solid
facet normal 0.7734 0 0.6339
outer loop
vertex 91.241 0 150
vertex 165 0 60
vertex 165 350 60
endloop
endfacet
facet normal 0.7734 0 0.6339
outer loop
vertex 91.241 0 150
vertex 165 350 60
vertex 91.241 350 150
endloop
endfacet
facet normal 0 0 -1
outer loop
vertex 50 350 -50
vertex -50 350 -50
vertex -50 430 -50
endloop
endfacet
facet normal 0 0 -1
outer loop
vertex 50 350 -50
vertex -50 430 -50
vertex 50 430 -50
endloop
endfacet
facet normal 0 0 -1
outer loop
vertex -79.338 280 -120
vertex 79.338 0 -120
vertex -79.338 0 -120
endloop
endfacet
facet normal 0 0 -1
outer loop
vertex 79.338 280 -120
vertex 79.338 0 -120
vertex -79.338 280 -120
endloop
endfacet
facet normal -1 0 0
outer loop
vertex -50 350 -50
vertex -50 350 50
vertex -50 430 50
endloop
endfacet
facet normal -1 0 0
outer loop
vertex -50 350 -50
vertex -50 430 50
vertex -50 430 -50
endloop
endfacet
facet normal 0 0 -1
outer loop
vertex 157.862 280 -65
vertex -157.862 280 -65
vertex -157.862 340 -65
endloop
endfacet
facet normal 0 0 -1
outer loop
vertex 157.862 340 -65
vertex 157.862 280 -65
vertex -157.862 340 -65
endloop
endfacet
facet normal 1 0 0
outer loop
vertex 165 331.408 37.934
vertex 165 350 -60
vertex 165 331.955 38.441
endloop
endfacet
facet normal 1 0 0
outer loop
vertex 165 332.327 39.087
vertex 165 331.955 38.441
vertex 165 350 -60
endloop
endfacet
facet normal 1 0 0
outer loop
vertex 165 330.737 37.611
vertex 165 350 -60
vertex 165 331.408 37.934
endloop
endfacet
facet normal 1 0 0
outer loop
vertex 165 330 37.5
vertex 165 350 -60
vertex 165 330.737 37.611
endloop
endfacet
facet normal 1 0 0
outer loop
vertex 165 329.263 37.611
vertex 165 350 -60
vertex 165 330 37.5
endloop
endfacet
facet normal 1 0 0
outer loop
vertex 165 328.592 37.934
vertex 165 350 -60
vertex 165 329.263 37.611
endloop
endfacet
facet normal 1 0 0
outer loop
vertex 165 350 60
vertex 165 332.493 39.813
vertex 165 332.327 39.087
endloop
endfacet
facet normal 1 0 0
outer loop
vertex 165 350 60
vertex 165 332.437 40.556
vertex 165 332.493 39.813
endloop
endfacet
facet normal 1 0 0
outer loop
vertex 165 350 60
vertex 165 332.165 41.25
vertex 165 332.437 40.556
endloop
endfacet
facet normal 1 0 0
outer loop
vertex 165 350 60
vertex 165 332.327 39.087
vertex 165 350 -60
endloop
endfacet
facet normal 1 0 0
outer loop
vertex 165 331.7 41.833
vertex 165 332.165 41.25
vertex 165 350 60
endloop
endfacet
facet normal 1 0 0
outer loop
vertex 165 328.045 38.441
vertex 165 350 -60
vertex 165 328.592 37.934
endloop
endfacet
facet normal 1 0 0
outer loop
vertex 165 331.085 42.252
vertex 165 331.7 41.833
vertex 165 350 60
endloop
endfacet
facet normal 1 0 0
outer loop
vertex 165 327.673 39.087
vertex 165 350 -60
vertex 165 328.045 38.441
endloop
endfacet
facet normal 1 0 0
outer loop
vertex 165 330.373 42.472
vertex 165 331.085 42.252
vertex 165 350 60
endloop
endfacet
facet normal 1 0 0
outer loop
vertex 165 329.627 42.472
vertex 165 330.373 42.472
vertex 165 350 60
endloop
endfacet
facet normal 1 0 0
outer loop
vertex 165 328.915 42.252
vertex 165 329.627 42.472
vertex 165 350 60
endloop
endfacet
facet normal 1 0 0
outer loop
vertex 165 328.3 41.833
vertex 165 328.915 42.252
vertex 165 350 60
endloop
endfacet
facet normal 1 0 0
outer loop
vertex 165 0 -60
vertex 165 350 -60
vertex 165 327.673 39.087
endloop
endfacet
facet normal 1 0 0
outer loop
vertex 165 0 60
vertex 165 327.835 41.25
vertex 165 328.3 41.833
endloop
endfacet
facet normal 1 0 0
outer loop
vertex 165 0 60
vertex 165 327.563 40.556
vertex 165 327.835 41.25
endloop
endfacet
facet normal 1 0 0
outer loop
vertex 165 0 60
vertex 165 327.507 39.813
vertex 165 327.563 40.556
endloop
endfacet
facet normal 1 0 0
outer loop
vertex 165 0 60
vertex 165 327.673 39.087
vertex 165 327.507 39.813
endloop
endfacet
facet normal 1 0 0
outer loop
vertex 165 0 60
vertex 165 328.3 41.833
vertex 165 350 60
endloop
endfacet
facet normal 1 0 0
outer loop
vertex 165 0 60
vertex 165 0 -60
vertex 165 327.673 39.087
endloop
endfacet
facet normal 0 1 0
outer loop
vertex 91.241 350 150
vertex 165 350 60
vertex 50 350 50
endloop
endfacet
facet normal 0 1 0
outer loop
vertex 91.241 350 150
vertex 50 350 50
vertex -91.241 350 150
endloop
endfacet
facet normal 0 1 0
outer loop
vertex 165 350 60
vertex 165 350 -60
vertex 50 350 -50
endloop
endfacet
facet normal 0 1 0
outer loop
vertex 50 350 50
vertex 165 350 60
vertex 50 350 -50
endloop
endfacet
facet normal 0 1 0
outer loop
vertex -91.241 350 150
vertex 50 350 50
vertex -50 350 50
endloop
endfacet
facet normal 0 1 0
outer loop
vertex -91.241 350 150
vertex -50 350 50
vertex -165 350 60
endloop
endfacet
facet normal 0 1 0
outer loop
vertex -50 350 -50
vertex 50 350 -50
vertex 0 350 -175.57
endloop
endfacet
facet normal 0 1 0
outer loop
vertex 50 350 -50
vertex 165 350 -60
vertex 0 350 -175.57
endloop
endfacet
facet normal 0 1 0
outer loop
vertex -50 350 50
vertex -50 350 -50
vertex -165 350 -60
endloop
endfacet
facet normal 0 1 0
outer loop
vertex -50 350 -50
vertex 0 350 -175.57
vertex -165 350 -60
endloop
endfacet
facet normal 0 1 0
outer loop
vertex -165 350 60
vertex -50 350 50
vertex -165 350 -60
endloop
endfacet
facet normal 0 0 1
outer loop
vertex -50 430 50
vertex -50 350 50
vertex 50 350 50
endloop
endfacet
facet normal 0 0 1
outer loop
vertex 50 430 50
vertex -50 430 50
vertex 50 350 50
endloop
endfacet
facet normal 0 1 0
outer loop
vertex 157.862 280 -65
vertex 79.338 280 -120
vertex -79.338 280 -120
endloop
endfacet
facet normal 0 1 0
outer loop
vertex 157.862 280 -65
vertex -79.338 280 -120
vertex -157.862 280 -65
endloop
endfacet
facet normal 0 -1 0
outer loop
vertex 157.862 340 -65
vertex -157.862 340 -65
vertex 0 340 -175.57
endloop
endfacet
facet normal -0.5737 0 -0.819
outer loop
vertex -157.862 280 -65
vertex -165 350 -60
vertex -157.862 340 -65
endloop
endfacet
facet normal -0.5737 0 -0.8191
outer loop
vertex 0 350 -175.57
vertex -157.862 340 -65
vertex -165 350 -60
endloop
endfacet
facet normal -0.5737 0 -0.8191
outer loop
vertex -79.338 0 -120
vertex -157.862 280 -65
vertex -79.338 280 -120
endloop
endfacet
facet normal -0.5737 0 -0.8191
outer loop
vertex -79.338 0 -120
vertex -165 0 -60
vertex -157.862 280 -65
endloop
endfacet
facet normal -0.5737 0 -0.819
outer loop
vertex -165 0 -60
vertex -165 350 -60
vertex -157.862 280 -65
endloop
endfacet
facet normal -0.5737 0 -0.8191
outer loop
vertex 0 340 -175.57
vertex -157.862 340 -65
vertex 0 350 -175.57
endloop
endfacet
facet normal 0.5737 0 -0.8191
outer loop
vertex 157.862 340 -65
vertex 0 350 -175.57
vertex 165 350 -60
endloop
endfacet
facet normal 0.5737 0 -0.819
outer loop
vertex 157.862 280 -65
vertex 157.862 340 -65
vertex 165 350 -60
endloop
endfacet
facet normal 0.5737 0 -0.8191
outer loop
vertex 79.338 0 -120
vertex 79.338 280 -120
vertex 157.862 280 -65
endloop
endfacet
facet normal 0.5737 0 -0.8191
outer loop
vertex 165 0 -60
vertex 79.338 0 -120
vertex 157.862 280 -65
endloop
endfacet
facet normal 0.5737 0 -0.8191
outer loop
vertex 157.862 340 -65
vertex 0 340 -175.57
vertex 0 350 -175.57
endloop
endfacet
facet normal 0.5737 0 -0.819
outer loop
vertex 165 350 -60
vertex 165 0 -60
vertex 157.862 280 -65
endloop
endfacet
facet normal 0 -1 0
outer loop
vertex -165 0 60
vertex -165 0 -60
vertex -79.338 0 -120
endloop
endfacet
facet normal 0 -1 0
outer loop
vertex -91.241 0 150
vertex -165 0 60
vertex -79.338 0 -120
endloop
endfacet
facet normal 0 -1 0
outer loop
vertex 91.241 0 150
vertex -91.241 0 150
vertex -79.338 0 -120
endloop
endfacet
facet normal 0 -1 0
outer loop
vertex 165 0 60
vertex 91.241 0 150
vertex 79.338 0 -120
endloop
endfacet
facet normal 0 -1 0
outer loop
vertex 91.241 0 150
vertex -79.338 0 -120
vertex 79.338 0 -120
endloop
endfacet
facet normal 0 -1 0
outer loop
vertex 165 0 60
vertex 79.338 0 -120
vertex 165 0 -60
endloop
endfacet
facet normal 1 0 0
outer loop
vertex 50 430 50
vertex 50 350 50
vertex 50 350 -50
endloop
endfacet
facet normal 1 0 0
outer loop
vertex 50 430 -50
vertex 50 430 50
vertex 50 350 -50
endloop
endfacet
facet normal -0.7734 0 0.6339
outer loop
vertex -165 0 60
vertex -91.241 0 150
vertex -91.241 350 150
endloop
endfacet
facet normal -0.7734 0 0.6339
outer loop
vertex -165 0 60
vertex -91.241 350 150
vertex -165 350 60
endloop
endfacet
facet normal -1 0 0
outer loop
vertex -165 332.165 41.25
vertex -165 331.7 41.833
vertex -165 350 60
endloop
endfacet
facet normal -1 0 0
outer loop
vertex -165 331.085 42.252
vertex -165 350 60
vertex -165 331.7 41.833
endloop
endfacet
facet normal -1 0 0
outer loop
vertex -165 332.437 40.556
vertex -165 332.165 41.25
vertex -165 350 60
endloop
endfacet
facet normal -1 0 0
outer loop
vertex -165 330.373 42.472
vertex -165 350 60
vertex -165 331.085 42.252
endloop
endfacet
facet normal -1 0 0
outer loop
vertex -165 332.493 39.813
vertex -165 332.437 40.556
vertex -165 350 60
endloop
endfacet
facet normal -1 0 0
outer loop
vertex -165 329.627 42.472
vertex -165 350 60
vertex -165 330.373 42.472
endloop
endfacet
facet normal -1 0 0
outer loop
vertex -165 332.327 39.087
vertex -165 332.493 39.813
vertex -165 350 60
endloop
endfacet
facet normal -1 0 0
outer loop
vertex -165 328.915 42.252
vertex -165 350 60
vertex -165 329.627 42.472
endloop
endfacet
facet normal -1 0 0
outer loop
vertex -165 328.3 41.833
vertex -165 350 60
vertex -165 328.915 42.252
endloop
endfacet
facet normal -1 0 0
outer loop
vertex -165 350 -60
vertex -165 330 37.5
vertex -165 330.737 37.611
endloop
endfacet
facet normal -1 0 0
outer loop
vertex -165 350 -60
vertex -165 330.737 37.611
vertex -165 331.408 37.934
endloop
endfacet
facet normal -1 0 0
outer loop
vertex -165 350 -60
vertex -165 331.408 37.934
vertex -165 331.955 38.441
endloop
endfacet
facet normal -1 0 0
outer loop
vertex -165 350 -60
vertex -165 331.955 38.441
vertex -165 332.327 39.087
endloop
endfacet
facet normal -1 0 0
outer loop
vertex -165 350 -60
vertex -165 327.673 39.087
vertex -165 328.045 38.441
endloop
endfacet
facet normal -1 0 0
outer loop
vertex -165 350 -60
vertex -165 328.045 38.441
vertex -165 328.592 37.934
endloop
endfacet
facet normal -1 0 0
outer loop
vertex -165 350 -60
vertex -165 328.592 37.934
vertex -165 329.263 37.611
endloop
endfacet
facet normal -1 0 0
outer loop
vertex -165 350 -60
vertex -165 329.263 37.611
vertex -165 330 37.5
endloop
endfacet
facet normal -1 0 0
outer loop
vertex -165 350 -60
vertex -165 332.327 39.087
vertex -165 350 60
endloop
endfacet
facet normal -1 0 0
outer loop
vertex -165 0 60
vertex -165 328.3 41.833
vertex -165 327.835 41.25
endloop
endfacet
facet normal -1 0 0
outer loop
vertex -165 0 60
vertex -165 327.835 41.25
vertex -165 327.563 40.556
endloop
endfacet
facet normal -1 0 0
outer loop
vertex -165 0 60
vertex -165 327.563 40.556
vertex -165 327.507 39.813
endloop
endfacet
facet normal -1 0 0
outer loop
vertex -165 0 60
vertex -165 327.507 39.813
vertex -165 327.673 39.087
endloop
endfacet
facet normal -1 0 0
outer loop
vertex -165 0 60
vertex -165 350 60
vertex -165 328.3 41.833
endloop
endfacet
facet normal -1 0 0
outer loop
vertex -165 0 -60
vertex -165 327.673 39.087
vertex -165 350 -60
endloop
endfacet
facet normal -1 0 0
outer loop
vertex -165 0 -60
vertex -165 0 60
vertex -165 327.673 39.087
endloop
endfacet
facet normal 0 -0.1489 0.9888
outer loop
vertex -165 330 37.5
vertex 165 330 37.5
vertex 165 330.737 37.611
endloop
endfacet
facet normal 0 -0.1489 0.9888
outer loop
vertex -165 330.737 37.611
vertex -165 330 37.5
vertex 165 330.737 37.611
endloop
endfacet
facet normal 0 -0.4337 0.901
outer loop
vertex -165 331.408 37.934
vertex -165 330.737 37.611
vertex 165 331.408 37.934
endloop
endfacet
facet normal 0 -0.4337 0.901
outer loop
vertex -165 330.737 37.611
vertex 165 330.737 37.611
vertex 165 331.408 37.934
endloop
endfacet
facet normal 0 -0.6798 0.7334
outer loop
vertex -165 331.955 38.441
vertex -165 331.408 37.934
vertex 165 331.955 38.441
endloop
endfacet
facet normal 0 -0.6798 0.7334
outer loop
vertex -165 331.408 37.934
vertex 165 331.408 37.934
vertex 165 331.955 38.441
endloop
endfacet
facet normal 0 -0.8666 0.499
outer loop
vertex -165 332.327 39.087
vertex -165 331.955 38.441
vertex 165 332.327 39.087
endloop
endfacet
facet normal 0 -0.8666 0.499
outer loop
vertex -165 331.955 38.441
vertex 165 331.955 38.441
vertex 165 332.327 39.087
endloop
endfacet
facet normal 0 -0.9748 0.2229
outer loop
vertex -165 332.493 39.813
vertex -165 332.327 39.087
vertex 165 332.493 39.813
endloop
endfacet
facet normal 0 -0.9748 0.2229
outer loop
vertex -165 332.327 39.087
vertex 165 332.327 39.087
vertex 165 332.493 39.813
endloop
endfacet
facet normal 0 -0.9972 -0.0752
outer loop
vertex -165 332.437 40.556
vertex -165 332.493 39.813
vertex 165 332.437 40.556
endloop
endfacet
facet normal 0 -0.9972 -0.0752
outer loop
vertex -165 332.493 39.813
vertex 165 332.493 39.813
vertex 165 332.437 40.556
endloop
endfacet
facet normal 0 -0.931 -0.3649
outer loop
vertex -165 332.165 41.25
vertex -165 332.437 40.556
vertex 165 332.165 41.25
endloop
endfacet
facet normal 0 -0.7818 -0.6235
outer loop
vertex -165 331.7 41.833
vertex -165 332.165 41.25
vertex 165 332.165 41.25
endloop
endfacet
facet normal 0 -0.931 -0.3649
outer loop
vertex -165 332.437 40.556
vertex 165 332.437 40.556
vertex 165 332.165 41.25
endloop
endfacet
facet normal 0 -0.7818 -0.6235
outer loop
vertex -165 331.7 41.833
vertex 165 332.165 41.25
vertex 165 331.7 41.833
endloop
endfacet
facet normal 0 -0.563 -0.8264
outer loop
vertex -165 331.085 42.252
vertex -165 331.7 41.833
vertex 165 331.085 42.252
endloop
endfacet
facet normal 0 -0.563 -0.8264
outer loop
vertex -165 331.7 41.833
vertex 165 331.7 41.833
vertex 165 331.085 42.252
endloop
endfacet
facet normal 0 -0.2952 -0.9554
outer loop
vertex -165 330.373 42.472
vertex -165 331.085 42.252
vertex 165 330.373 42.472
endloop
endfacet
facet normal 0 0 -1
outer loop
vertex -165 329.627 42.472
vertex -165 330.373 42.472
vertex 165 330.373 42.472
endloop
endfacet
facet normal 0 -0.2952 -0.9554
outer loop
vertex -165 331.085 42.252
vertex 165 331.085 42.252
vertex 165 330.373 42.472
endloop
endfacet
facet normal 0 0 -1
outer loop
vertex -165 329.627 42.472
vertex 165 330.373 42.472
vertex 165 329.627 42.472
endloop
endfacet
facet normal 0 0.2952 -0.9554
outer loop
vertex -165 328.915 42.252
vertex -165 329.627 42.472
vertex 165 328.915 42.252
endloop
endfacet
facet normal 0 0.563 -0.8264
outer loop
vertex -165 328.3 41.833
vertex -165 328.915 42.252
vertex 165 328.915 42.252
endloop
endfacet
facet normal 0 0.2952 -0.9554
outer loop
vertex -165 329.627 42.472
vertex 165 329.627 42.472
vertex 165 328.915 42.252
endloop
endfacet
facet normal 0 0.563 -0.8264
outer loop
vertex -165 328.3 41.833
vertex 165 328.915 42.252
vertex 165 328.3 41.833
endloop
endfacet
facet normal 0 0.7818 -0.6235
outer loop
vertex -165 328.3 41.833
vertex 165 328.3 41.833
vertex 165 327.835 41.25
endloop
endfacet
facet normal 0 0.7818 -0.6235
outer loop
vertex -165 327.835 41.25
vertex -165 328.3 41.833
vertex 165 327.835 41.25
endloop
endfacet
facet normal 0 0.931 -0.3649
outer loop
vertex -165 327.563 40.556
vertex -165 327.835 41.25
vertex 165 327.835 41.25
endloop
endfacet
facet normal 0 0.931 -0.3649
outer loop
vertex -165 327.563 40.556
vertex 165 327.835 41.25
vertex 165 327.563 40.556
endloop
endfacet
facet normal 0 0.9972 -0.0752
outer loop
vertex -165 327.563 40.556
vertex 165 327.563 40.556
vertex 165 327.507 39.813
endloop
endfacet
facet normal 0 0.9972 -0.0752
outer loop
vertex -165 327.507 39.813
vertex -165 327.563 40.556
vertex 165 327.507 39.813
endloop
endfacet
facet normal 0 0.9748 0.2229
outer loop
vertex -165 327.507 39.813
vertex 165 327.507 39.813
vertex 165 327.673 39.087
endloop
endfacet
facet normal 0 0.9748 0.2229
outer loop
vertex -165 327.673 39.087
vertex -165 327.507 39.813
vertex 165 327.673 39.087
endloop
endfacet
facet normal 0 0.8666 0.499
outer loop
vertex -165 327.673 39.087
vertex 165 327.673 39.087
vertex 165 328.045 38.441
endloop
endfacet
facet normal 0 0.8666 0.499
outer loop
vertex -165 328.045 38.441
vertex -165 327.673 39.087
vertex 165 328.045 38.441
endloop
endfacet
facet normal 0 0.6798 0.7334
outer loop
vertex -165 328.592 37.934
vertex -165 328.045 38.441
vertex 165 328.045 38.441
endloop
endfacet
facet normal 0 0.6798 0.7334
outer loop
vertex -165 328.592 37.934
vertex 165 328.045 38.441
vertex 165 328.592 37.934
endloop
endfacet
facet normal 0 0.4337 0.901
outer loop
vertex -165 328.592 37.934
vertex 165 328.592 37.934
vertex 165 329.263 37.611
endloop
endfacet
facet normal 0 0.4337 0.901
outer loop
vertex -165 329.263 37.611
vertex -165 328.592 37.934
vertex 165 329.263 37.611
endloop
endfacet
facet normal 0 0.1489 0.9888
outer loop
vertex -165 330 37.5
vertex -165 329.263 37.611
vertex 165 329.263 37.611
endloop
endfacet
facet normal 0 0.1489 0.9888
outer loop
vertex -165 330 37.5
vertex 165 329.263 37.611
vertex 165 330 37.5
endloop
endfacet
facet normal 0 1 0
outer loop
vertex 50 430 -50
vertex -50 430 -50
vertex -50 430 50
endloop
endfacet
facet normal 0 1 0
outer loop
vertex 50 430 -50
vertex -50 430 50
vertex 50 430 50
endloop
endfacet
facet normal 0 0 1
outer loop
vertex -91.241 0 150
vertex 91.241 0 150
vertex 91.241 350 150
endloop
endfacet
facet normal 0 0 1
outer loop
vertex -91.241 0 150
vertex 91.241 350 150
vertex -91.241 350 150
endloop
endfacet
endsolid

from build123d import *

# Parameters (mm, degrees)
BOSS_EXTRU_1_DEPTH      = 350
ESQUISSE2_W             = 100
ESQUISSE2_H             = 100
BOSS_EXTRU_2_DEPTH      = 430
ENL_V_MAT_EXTRU_1_DEPTH = 570.758720863
ESQUISSE4_R             = 2.5
ENL_V_MAT_EXTRU_2_DEPTH = 570.758720863


with BuildPart() as part:
    # Esquisse1 → Boss.-Extru.1 (new body)
    with BuildSketch(Plane(origin=(0, 0, 0), x_dir=(1, 0, 0), z_dir=(0, 1, 0))):
        Polygon((-165, 60), (0, 175.570498661), (165, 60), (165, -60), (91.241437954, -150), (-91.241437954, -150), (-165, -60), align=None)
    extrude(amount=BOSS_EXTRU_1_DEPTH)

    # Esquisse2 → Boss.-Extru.2 (add)
    with BuildSketch(Plane(origin=(0, 0, 0), x_dir=(1, 0, 0), z_dir=(0, 1, 0))):
        Rectangle(ESQUISSE2_W, ESQUISSE2_H)
    extrude(amount=BOSS_EXTRU_2_DEPTH)

    # Esquisse3 → Enlèv. mat.-Extru.1 (cut, through all)
    with BuildSketch(Plane(origin=(165, 0, 0), x_dir=(0, 0, -1), z_dir=(1, 0, 0))):
        Polygon((175.570498661, 0), (120, 0), (120, 280), (65, 280), (65, 340), (175.570498661, 340), align=None)
    extrude(amount=-ENL_V_MAT_EXTRU_1_DEPTH, mode=Mode.SUBTRACT)

    # Esquisse4 → Enlèv. mat.-Extru.2 (cut, through all)
    with BuildSketch(Plane(origin=(165, 0, 0), x_dir=(0, 0, -1), z_dir=(1, 0, 0))):
        with Locations((-40, 330)):
            Circle(ESQUISSE4_R)
    extrude(amount=-ENL_V_MAT_EXTRU_2_DEPTH, mode=Mode.SUBTRACT)


solid = part.part
